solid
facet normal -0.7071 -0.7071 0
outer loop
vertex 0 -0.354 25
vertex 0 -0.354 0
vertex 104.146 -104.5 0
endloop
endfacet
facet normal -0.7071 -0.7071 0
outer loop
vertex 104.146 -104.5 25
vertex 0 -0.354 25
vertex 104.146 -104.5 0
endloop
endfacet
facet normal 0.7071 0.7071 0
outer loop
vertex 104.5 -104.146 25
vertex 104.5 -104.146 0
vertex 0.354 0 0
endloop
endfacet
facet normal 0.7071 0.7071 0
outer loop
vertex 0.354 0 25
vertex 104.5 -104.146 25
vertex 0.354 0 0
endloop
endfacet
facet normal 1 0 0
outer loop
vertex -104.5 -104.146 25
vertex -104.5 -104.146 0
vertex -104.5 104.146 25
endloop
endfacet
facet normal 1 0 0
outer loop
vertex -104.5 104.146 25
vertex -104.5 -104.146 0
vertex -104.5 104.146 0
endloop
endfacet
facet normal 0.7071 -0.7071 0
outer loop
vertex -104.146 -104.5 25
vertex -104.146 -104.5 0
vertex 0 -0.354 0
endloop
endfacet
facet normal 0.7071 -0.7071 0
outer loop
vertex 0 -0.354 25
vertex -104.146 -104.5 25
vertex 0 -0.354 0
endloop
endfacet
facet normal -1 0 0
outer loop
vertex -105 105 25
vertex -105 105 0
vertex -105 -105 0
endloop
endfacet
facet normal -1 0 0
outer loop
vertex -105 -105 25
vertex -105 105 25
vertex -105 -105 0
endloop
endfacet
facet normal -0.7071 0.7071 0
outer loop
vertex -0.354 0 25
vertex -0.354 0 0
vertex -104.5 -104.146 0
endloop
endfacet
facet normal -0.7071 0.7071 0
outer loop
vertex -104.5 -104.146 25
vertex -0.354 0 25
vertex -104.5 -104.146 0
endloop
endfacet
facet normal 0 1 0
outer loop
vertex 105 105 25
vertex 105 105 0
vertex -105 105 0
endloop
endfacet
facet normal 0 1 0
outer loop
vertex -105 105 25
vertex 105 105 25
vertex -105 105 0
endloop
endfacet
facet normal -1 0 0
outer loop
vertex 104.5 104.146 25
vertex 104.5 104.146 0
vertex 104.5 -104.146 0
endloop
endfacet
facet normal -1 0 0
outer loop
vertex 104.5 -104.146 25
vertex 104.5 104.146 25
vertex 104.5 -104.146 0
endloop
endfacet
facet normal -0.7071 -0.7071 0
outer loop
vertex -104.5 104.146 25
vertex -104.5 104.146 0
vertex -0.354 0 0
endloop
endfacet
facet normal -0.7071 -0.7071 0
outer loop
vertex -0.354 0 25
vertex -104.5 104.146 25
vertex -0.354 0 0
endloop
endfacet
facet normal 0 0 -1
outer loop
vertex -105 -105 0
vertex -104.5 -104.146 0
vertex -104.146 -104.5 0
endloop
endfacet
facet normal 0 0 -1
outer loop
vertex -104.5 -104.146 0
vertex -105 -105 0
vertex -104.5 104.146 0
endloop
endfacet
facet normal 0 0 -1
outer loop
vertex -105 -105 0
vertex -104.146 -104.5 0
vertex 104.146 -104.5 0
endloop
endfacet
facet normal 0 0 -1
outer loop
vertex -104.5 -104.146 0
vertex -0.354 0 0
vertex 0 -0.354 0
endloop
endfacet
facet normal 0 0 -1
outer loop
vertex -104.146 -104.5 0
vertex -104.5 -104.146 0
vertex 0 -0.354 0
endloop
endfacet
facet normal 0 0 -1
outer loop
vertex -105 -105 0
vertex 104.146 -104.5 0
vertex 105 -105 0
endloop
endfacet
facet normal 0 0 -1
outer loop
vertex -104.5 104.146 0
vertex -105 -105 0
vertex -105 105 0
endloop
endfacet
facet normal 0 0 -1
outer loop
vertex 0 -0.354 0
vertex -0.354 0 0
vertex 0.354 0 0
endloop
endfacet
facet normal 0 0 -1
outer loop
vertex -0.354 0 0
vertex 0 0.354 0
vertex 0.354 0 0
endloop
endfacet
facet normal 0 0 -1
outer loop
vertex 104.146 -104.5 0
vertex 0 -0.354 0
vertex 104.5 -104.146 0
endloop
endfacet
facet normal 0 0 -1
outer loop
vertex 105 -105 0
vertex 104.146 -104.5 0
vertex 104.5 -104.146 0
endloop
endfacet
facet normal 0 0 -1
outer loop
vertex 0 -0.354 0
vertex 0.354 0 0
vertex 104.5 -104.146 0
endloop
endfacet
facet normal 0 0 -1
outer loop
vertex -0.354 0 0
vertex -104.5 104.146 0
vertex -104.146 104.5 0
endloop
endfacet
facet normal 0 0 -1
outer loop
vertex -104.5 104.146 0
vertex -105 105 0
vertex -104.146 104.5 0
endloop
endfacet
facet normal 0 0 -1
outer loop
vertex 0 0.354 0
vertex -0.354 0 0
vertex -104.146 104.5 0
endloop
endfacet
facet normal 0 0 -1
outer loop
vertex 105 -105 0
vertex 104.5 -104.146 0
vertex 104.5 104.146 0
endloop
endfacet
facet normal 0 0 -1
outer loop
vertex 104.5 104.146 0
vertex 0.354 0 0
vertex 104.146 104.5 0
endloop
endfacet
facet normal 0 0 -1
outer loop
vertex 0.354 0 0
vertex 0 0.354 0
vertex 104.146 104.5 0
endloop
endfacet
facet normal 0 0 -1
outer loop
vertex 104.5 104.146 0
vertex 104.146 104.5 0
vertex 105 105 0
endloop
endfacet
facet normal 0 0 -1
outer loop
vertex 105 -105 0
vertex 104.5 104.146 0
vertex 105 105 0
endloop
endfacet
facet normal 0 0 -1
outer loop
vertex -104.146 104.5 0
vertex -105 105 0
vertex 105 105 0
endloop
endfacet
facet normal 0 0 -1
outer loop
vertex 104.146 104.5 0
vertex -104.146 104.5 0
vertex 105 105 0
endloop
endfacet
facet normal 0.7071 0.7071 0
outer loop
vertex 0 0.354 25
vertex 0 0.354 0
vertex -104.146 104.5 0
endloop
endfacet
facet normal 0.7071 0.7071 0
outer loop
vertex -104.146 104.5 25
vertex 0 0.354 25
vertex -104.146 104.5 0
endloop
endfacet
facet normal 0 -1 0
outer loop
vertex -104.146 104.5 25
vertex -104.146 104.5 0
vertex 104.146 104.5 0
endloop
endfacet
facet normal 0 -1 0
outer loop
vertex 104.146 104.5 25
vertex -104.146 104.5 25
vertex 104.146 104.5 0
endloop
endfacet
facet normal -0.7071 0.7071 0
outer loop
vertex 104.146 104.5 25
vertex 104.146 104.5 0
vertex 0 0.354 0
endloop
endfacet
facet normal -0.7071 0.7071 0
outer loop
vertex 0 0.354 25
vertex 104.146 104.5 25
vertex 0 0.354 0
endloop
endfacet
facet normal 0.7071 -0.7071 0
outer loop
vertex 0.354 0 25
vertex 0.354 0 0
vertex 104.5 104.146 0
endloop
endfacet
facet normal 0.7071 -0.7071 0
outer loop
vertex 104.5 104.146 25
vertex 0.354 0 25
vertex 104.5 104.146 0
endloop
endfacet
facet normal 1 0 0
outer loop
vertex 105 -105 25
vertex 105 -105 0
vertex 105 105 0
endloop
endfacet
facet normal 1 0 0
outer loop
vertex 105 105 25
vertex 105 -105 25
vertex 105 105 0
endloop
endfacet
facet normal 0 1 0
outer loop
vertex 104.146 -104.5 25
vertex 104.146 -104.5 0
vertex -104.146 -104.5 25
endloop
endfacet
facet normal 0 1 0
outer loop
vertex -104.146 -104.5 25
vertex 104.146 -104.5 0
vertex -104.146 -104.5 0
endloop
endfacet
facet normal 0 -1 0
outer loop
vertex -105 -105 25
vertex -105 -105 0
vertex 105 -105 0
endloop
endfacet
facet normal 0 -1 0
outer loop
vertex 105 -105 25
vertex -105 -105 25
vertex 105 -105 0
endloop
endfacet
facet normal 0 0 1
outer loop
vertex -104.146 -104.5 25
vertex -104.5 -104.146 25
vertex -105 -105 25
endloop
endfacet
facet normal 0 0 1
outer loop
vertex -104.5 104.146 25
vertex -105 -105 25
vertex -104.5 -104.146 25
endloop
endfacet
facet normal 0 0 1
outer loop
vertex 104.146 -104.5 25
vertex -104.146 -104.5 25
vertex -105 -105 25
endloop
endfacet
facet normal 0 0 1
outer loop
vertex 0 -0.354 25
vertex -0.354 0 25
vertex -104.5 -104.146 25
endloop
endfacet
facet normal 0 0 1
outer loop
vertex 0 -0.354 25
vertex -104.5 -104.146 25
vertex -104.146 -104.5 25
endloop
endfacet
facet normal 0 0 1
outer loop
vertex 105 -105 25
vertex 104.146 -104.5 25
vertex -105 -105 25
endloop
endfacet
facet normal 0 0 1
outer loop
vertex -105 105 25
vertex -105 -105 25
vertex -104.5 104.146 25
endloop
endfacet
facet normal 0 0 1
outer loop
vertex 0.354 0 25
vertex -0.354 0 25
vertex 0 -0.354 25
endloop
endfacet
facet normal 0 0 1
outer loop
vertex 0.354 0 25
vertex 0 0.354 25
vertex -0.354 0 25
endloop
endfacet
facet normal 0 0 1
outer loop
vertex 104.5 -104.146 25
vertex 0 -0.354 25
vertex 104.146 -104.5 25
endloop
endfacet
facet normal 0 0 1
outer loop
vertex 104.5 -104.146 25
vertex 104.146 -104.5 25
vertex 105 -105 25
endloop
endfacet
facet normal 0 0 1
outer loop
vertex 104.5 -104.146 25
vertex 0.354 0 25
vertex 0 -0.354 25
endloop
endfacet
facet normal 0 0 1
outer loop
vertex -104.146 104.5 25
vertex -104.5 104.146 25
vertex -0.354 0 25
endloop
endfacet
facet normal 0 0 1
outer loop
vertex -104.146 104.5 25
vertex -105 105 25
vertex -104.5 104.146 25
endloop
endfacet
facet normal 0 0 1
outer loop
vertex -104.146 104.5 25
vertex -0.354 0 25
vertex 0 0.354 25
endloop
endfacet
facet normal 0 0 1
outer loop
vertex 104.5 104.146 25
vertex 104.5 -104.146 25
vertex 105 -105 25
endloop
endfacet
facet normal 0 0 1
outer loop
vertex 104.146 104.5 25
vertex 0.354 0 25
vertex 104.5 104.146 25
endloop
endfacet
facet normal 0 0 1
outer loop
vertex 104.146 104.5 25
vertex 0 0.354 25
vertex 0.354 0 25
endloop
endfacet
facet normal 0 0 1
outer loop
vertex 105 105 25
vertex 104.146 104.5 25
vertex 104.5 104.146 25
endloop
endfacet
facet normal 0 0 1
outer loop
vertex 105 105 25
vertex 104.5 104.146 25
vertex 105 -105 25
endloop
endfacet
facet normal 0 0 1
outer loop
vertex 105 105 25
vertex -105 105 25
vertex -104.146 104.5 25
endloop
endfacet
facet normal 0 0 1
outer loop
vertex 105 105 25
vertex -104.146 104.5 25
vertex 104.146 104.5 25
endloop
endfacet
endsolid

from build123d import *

# Parameters (mm, degrees)
F1_DEPTH = 25


with BuildPart() as f1:
    # F0 (on Top) → F1 (new body)
    with BuildSketch(Plane.XY):
        Polygon((-104.5, 104.1464466094), (-105, 104.6464466094), (-105, -104.6464466094), (-104.5, -104.1464466094), align=None)
        Polygon((-104.1464466094, -104.5), (-104.6464466094, -105), (104.6464466094, -105), (104.1464466094, -104.5), align=None)
        Polygon((-104.5, -104.5), (-105, -105), (-104.6464466094, -105), (-104.1464466094, -104.5), align=None)
        Polygon((-104.5, -104.1464466094), (-105, -104.6464466094), (-105, -105), (-104.5, -104.5), align=None)
        Polygon((-0.1767766953, -0.1767766953), (-104.5, -104.5), (-104.1464466094, -104.5), (0, -0.3535533906), align=None)
        Polygon((-0.3535533906, 0), (-104.5, -104.1464466094), (-104.5, -104.5), (-0.1767766953, -0.1767766953), align=None)
        Polygon((105, -104.6464466094), (105, 104.6464466094), (104.5, 104.1464466094), (104.5, -104.1464466094), align=None)
        Polygon((105, -105), (105, -104.6464466094), (104.5, -104.1464466094), (104.5, -104.5), align=None)
        Polygon((104.1464466094, -104.5), (104.6464466094, -105), (105, -105), (104.5, -104.5), align=None)
        Polygon((104.5, -104.5), (0.1767766953, -0.1767766953), (0, -0.3535533906), (104.1464466094, -104.5), align=None)
        Polygon((0.3535533906, 0), (0.1767766953, -0.1767766953), (104.5, -104.5), (104.5, -104.1464466094), align=None)
        Polygon((0, 0), (-0.1767766953, 0.1767766953), (-0.3535533906, 0), (-0.1767766953, -0.1767766953), align=None)
        Polygon((0.1767766953, -0.1767766953), (0, 0), (-0.1767766953, -0.1767766953), (0, -0.3535533906), align=None)
        Polygon((0.1767766953, 0.1767766953), (0, 0), (0.1767766953, -0.1767766953), (0.3535533906, 0), align=None)
        Polygon((0, 0.3535533906), (-0.1767766953, 0.1767766953), (0, 0), (0.1767766953, 0.1767766953), align=None)
        Polygon((104.5, 104.1464466094), (104.5, 104.5), (0.1767766953, 0.1767766953), (0.3535533906, 0), align=None)
        Polygon((104.5, 104.5), (104.1464466094, 104.5), (0, 0.3535533906), (0.1767766953, 0.1767766953), align=None)
        Polygon((-104.1464466094, 104.5), (-104.5, 104.5), (-0.1767766953, 0.1767766953), (0, 0.3535533906), align=None)
        Polygon((-0.1767766953, 0.1767766953), (-104.5, 104.5), (-104.5, 104.1464466094), (-0.3535533906, 0), align=None)
        Polygon((-104.5, 104.5), (-105, 105), (-105, 104.6464466094), (-104.5, 104.1464466094), align=None)
        Polygon((-104.6464466094, 105), (-105, 105), (-104.5, 104.5), (-104.1464466094, 104.5), align=None)
        Polygon((104.6464466094, 105), (-104.6464466094, 105), (-104.1464466094, 104.5), (104.1464466094, 104.5), align=None)
        Polygon((105, 105), (104.6464466094, 105), (104.1464466094, 104.5), (104.5, 104.5), align=None)
        Polygon((105, 104.6464466094), (105, 105), (104.5, 104.5), (104.5, 104.1464466094), align=None)
    extrude(amount=F1_DEPTH)


solid = f1.part
